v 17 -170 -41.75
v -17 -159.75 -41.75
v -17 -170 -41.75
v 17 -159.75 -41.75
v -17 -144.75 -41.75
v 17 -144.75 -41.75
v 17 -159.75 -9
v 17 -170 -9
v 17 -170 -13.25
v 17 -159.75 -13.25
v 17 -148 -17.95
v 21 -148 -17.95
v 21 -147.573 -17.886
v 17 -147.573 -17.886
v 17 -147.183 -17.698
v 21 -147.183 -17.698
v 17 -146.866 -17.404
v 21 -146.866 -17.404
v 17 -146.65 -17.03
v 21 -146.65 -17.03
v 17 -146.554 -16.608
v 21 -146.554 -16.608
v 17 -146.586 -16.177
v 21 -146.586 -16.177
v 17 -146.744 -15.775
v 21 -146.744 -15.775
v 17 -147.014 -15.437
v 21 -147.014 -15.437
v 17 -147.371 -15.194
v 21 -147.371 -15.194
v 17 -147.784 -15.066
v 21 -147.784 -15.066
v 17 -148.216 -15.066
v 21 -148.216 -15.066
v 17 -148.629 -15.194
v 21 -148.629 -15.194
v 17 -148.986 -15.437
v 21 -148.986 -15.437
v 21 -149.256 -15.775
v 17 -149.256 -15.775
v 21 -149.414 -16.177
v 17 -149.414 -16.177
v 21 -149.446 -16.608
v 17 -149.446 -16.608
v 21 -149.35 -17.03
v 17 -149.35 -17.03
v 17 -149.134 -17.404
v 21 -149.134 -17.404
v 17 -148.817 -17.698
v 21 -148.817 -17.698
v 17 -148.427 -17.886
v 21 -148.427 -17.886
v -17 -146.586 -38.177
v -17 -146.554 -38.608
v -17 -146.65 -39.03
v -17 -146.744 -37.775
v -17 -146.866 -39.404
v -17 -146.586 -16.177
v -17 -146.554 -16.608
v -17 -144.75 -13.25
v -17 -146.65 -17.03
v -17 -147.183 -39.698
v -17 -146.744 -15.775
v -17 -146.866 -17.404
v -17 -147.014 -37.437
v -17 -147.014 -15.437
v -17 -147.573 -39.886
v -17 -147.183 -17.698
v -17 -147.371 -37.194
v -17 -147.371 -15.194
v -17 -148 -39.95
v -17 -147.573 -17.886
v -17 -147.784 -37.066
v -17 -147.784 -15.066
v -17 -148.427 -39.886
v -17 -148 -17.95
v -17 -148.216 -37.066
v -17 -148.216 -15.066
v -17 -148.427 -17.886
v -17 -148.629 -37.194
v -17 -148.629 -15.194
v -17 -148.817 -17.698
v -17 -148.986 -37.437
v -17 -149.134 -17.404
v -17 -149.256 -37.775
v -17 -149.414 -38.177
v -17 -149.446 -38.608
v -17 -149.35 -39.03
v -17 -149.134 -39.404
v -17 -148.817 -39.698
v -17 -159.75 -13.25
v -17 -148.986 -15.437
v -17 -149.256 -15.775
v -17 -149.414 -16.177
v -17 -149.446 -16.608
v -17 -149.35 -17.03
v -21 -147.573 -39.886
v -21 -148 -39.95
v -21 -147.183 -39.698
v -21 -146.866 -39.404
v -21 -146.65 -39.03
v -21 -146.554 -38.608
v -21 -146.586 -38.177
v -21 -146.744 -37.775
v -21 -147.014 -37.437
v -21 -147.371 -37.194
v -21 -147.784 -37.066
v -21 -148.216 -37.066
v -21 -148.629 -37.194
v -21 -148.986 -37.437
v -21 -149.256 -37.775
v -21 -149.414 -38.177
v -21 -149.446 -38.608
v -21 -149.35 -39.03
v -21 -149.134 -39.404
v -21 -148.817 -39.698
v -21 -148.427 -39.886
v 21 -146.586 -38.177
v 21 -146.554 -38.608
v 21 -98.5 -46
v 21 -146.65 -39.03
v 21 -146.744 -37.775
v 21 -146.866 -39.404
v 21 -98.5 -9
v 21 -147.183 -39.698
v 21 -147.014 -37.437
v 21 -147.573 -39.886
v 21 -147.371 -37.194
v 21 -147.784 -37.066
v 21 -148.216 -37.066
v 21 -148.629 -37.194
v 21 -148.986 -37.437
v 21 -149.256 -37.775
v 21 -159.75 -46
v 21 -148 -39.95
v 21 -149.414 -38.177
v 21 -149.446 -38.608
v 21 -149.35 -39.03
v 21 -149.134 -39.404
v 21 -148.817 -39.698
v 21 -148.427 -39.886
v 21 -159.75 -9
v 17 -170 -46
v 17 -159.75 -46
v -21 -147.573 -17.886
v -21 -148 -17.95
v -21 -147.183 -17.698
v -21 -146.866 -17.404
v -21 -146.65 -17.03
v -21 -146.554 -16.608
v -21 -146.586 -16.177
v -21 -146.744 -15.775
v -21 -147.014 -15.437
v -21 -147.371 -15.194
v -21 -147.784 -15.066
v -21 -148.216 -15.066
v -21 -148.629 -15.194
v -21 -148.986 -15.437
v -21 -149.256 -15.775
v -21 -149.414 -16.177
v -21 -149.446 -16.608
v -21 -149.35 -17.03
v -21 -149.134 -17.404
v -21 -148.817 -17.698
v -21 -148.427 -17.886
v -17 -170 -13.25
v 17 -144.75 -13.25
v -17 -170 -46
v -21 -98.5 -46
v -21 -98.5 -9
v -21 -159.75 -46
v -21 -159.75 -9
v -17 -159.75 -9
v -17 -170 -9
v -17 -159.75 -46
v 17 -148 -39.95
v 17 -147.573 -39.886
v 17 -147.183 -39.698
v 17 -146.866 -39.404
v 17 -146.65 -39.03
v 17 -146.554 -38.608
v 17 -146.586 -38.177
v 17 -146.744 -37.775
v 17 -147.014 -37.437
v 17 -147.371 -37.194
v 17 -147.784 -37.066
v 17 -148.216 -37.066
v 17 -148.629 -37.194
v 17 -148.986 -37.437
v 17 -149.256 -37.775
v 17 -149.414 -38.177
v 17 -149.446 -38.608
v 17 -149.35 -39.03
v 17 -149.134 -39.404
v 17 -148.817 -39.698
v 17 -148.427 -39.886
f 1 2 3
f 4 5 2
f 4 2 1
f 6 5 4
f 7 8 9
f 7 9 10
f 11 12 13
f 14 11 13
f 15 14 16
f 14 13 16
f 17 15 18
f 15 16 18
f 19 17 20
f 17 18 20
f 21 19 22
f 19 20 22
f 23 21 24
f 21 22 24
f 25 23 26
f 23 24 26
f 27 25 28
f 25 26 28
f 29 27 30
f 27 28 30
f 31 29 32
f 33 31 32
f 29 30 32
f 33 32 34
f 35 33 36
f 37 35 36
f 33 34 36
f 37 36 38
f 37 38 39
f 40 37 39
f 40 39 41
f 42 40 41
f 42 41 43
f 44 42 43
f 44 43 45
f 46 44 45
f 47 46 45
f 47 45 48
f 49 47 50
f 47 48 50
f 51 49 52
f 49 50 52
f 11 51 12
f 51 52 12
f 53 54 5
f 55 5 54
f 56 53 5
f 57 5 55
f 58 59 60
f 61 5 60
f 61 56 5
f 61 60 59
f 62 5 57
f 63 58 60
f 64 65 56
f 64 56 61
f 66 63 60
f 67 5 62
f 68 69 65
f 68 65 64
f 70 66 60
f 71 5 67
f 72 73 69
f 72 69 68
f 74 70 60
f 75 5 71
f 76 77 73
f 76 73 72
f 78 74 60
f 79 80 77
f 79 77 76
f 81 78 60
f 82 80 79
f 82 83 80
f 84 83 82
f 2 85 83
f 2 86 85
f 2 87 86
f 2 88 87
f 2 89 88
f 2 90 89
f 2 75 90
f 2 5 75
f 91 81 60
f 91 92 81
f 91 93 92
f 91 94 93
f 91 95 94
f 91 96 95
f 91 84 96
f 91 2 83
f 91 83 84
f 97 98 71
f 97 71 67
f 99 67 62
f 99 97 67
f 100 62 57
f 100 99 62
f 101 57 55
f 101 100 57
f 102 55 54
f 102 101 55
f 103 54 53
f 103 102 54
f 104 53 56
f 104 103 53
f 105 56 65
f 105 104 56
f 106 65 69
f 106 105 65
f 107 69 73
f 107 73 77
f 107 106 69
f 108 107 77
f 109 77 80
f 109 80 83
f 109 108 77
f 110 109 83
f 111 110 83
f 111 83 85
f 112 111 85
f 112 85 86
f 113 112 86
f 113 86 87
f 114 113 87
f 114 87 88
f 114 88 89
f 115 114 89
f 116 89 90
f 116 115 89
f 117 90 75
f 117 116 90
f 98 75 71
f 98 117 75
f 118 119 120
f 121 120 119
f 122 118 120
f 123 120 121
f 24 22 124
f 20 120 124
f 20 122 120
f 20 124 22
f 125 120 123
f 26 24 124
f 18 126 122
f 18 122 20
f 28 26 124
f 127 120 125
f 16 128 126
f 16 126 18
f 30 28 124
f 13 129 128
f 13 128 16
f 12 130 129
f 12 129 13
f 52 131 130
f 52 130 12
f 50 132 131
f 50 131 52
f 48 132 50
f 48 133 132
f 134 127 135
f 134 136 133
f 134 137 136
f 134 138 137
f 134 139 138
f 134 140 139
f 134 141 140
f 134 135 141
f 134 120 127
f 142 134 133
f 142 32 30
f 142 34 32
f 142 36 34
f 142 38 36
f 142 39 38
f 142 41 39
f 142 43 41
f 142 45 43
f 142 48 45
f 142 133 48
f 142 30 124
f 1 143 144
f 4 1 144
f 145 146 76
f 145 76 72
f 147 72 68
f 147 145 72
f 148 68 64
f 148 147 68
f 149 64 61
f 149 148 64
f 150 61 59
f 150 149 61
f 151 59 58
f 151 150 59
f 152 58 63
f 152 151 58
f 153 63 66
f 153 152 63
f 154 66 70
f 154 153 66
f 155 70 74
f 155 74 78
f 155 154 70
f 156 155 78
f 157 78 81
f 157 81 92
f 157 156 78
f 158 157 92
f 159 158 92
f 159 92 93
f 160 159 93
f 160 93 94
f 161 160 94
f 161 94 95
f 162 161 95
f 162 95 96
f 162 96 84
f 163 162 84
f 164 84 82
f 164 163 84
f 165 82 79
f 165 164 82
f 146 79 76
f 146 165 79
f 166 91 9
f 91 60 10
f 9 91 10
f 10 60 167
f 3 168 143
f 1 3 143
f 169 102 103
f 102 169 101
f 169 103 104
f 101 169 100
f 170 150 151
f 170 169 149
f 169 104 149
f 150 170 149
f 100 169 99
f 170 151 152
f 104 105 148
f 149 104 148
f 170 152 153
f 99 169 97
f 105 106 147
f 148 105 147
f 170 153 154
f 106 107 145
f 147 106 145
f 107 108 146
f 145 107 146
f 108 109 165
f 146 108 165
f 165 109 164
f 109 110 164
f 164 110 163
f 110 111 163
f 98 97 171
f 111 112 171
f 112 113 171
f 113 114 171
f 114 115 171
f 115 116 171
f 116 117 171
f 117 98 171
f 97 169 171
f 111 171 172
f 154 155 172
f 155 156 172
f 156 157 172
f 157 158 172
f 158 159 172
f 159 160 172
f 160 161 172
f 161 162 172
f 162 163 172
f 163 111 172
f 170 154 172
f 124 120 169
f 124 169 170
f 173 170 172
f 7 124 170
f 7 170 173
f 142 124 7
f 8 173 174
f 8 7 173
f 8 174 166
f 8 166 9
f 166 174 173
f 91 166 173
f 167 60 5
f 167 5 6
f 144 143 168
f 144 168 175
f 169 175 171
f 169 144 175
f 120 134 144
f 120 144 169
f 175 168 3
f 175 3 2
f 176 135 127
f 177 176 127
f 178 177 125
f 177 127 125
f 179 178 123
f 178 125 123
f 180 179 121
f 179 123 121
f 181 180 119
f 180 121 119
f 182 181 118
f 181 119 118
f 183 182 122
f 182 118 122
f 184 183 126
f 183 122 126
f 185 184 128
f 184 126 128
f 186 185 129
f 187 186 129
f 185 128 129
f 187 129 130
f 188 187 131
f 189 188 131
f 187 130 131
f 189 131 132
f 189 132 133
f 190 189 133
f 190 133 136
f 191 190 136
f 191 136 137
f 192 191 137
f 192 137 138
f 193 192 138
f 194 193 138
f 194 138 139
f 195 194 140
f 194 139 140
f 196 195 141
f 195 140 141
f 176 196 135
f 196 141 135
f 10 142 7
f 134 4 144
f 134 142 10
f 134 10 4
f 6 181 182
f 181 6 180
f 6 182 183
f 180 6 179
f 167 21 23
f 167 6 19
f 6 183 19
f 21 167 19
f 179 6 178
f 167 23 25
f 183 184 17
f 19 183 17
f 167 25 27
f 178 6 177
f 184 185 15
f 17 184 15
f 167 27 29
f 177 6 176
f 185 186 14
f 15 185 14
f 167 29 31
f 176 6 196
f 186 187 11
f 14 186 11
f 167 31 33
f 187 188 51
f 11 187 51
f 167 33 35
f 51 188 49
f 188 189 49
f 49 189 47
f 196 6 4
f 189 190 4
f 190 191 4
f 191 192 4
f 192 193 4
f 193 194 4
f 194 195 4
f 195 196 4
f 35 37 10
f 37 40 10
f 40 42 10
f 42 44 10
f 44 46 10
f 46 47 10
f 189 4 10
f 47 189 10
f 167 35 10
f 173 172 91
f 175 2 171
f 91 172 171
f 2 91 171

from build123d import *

# Parameters (mm, degrees)
SKETCH1_W               = 50
SKETCH1_H               = 150
BOSS_EXTRUDE1_DEPTH     = 55
CUT_EXTRUDE1_DEPTH      = 168.406690428
CUT_EXTRUDE1_DEPTH_BACK = 45
SKETCH2_R               = 10.25
SKETCH7_R               = 1
SKETCH7_R_2             = 4.25
CUT_EXTRUDE3_DEPTH      = 10
SKETCH8_W               = 55
SKETCH8_H               = 55
SKETCH8_R               = 10.25
BOSS_EXTRUDE2_DEPTH     = 50
SKETCH10_W              = 8
SKETCH10_H              = 10.25
SKETCH10_W_2            = 17
SKETCH10_H_2            = 1
SKETCH10_W_3            = 34
SKETCH10_H_3            = 20
SKETCH10_H_4            = 5
CUT_EXTRUDE4_DEPTH      = 214.717102732
SKETCH11_W              = 34
SKETCH11_H              = 13.25
BOSS_EXTRUDE4_DEPTH     = 25
SKETCH13_W              = 55
SKETCH13_H              = 10
CUT_EXTRUDE5_DEPTH      = 8
SKETCH14_R              = 5.030159043
CUT_EXTRUDE6_DEPTH      = 8
SKETCH15_W              = 34
SKETCH15_H              = 0.25
BOSS_EXTRUDE5_DEPTH     = 13.25
CUT_EXTRUDE7_DEPTH      = 181.416185527
BOSS_EXTRUDE6_START     = 1.5
SKETCH19_R              = 10.25
SKETCH19_R_2            = 1
SKETCH19_R_3            = 4.25
BOSS_EXTRUDE6_DEPTH     = 1.5
CUT_EXTRUDE8_DEPTH      = 184.89467094
SKETCH21_R              = 5.030159043
SKETCH21_R_2            = 4.5
BOSS_EXTRUDE7_DEPTH     = 8
SKETCH24_W              = 4
SKETCH24_H              = 30
CUT_EXTRUDE10_DEPTH     = 181.416185527
SKETCH25_W              = 55
SKETCH25_H              = 86.25
CUT_EXTRUDE11_DEPTH     = 4
BOSS_EXTRUDE8_START     = 4
SKETCH26_R              = 1
SKETCH26_R_2            = 4.25
BOSS_EXTRUDE8_DEPTH     = 4
SKETCH27_W              = 4
SKETCH27_H              = 123.25
CUT_EXTRUDE12_DEPTH     = 181.416185527
CUT_EXTRUDE13_DEPTH     = 180.905530765
SKETCH29_W              = 42
SKETCH29_H              = 9
CUT_EXTRUDE15_DEPTH     = 174.776436838
SKETCH30_R              = 4.5
SKETCH30_R_2            = 1.45
BOSS_EXTRUDE9_DEPTH     = 4
SKETCH31_W              = 37
SKETCH31_H              = 55
CUT_EXTRUDE16_DEPTH     = 182.05247858
SKETCH32_W              = 93.338891709
SKETCH32_H              = 62.145945894
CUT_EXTRUDE17_DEPTH     = 182.05247858


with BuildPart() as part:
    # Sketch1 → Boss-Extrude1 (new body)
    with BuildSketch(Plane.XY):
        with Locations((0, -75)):
            Rectangle(SKETCH1_W, SKETCH1_H)
    extrude(amount=-BOSS_EXTRUDE1_DEPTH)

    # Sketch2 → Cut-Extrude1 (cut, two sides: drawn at the far end of the back side and taken through both)
    with BuildSketch(Plane(origin=(25, 0, 0), x_dir=(0, 0, -1), z_dir=(1, 0, 0)).offset(-CUT_EXTRUDE1_DEPTH_BACK)):
        with Locations(Location((27.5, -25, 0), (0, 0, 270))):
            Circle(SKETCH2_R)
    extrude(amount=CUT_EXTRUDE1_DEPTH + CUT_EXTRUDE1_DEPTH_BACK, mode=Mode.SUBTRACT)

    # Sketch7 → Cut-Extrude3 (cut)
    with BuildSketch(Plane(origin=(-20, 0, 0), x_dir=(0, 0, -1), z_dir=(1, 0, 0))):
        with Locations(Location((27.5, -17, 0), (0, 0, 90))):
            Circle(SKETCH7_R)
        with Locations(Location((35.5, -25, 0), (0, 0, 90))):
            Circle(SKETCH7_R)
        with Locations(Location((27.5, -33, 0), (0, 0, 90))):
            Circle(SKETCH7_R)
        with Locations(Location((19.5, -25, 0), (0, 0, 90))):
            Circle(SKETCH7_R)
        with Locations(Location((27.5, -25, 0), (0, 0, 90))):
            Circle(SKETCH7_R_2)
    extrude(amount=-CUT_EXTRUDE3_DEPTH, mode=Mode.SUBTRACT)

    # Sketch8 → Boss-Extrude2 (add)
    with BuildSketch(Plane(origin=(25, 0, 0), x_dir=(0, 0, -1), z_dir=(1, 0, 0))):
        with Locations((27.5, -177.5)):
            Rectangle(SKETCH8_W, SKETCH8_H)
        with Locations(Location((27.5, -180, 0), (0, 0, 90))):
            Circle(SKETCH8_R, mode=Mode.SUBTRACT)
    extrude(amount=-BOSS_EXTRUDE2_DEPTH)

    # Sketch10 → Cut-Extrude4 (cut, through all)
    with BuildSketch(Plane.XY):
        Polygon((-17, -205), (17, -205), (17, -191.25), (0, -191.25), (-17, -191.25), align=None)
        Polygon((-25, -205), (-17, -205), (-17, -191.25), (-17, -190.25), (-25, -190.25), align=None)
        Polygon((17, -191.25), (17, -205), (25, -205), (25, -190.25), (17, -190.25), align=None)
        with Locations((-21, -185.125)):
            Rectangle(SKETCH10_W, SKETCH10_H)
        with Locations((-21, -174.875)):
            Rectangle(SKETCH10_W, SKETCH10_H)
        with Locations((21, -174.875)):
            Rectangle(SKETCH10_W, SKETCH10_H)
        with Locations((21, -185.125)):
            Rectangle(SKETCH10_W, SKETCH10_H)
        with Locations((-8.5, -185.125)):
            Rectangle(SKETCH10_W_2, SKETCH10_H)
        with Locations((8.5, -185.125)):
            Rectangle(SKETCH10_W_2, SKETCH10_H)
        Polygon((0, -180), (17, -180), (17, -169.75), (-17, -169.75), (-17, -180), align=None)
        with Locations((-8.5, -190.75)):
            Rectangle(SKETCH10_W_2, SKETCH10_H_2)
        with Locations((8.5, -190.75)):
            Rectangle(SKETCH10_W_2, SKETCH10_H_2)
        with Locations((0, -154.75)):
            Rectangle(SKETCH10_W_3, SKETCH10_H_3)
        with Locations((0, -167.25)):
            Rectangle(SKETCH10_W_3, SKETCH10_H_4)
    extrude(amount=-CUT_EXTRUDE4_DEPTH, mode=Mode.SUBTRACT)

    # Sketch11 → Boss-Extrude4 (add)
    with BuildSketch(Plane.XZ.offset(144.75)):
        with Locations((0, -6.625)):
            Rectangle(SKETCH11_W, SKETCH11_H)
        with Locations((0, -48.375)):
            Rectangle(SKETCH11_W, SKETCH11_H)
    extrude(amount=BOSS_EXTRUDE4_DEPTH)

    # Sketch13 → Cut-Extrude5 (cut)
    with BuildSketch(Plane(origin=(25, 0, 0), x_dir=(0, 0, -1), z_dir=(1, 0, 0))):
        with Locations((27.5, -164.75)):
            Rectangle(SKETCH13_W, SKETCH13_H)
    cut_extrude5 = extrude(amount=-CUT_EXTRUDE5_DEPTH, mode=Mode.SUBTRACT)

    # Mirror2: Cut-Extrude5 across plane
    add(cut_extrude5.mirror(Plane(origin=(0, 0, 0), x_dir=(0, 0, 1), z_dir=(1, 0, 0))), mode=Mode.SUBTRACT)

    # Sketch14 → Cut-Extrude6 (cut)
    with BuildSketch(Plane(origin=(25, 0, 0), x_dir=(0, 0, -1), z_dir=(1, 0, 0))):
        with Locations(Location((16.5, -148, 0), (0, 0, 90))):
            Circle(SKETCH14_R)
        with Locations(Location((38.5, -148, 0), (0, 0, 90))):
            Circle(SKETCH14_R)
    cut_extrude6 = extrude(amount=-CUT_EXTRUDE6_DEPTH, mode=Mode.SUBTRACT)

    # Mirror3: Cut-Extrude6 across plane
    add(cut_extrude6.mirror(Plane(origin=(0, 0, 0), x_dir=(0, 0, 1), z_dir=(1, 0, 0))), mode=Mode.SUBTRACT)

    # Sketch15 → Boss-Extrude5 (add)
    with BuildSketch(Plane.XY):
        with Locations((0, -169.875)):
            Rectangle(SKETCH15_W, SKETCH15_H)
    boss_extrude5 = extrude(amount=-BOSS_EXTRUDE5_DEPTH)

    # Mirror4: Boss-Extrude5 across plane
    add(boss_extrude5.mirror(Plane.XY.offset(-27.5)))

    # Sketch16 → Cut-Extrude7 (cut, through all)
    with BuildSketch(Plane.XY):
        Polygon((-18.5, 0), (-18.5, -14.75), (-18.5, -35.25), (-18.5, -43.5), (25, -43.5), (25, 0), align=None)
    extrude(amount=-CUT_EXTRUDE7_DEPTH, mode=Mode.SUBTRACT)

    # Sketch19 → Boss-Extrude6 (add)
    with BuildSketch(Plane(origin=(-20, 0, 0), x_dir=(0, 0, -1), z_dir=(1, 0, 0)).offset(BOSS_EXTRUDE6_START)):
        with Locations((27.5, -25)):
            Circle(SKETCH19_R)
        with Locations(Location((27.5, -17, 0), (0, 0, 90))):
            Circle(SKETCH19_R_2, mode=Mode.SUBTRACT)
        with Locations(Location((27.5, -33, 0), (0, 0, 90))):
            Circle(SKETCH19_R_2, mode=Mode.SUBTRACT)
        with Locations(Location((19.5, -25, 0), (0, 0, 90))):
            Circle(SKETCH19_R_2, mode=Mode.SUBTRACT)
        with Locations(Location((35.5, -25, 0), (0, 0, 90))):
            Circle(SKETCH19_R_2, mode=Mode.SUBTRACT)
        with Locations(Location((27.5, -25, 0), (0, 0, 90))):
            Circle(SKETCH19_R_3, mode=Mode.SUBTRACT)
    extrude(amount=-BOSS_EXTRUDE6_DEPTH)

    # Sketch20 → Cut-Extrude8 (cut, through all)
    with BuildSketch(Plane(origin=(-18.5, 0, 0), x_dir=(0, 0, -1), z_dir=(1, 0, 0))):
        with BuildLine():
            Line((0, 0), (0, -43.5))
            Line((0, -43.5), (9, -43.5))
            Line((9, -43.5), (9, -25))
            ThreePointArc((9, -25), (27.5, -6.5), (46, -25))
            Line((46, -25), (46, -43.5))
            Line((46, -43.5), (55, -43.5))
            Line((55, -43.5), (55, 0))
            Line((55, 0), (0, 0))
        make_face()
    extrude(amount=-CUT_EXTRUDE8_DEPTH, mode=Mode.SUBTRACT)

    # Sketch21 → Boss-Extrude7 (add)
    # profile 1 of 2: a face of its own
    with BuildSketch(Plane(origin=(25, 0, 0), x_dir=(0, 0, -1), z_dir=(1, 0, 0))):
        with Locations(Location((16.5, -148, 0), (0, 0, 229.751587581))):
            Circle(SKETCH21_R)
        with Locations(Location((16.5, -148, 0), (0, 0, 90))):
            Circle(SKETCH21_R_2, mode=Mode.SUBTRACT)
    # profile 2 of 2: a face of its own
    with BuildSketch(Plane(origin=(25, 0, 0), x_dir=(0, 0, -1), z_dir=(1, 0, 0))):
        with Locations(Location((38.5, -148, 0), (0, 0, 310.248412419))):
            Circle(SKETCH21_R)
        with Locations(Location((38.5, -148, 0), (0, 0, 90))):
            Circle(SKETCH21_R_2, mode=Mode.SUBTRACT)
    boss_extrude7 = extrude(amount=-BOSS_EXTRUDE7_DEPTH)

    # Mirror5: Boss-Extrude7 across plane
    add(boss_extrude7.mirror(Plane(origin=(0, 0, 0), x_dir=(0, 0, 1), z_dir=(1, 0, 0))))

    # Sketch24 → Cut-Extrude10 (cut, through all)
    with BuildSketch(Plane.XY):
        with Locations((-23, -144.75)):
            Rectangle(SKETCH24_W, SKETCH24_H)
        with Locations((23, -144.75)):
            Rectangle(SKETCH24_W, SKETCH24_H)
    extrude(amount=-CUT_EXTRUDE10_DEPTH, mode=Mode.SUBTRACT)

    # Sketch25 → Cut-Extrude11 (cut)
    with BuildSketch(Plane(origin=(25, 0, 0), x_dir=(0, 0, -1), z_dir=(1, 0, 0))):
        with Locations((27.5, -86.625)):
            Rectangle(SKETCH25_W, SKETCH25_H)
    extrude(amount=-CUT_EXTRUDE11_DEPTH, mode=Mode.SUBTRACT)

    # Sketch26 → Boss-Extrude8 (add)
    with BuildSketch(Plane(origin=(-18.5, 0, 0), x_dir=(0, 0, -1), z_dir=(1, 0, 0)).offset(BOSS_EXTRUDE8_START)):
        with BuildLine():
            Line((46, -43.5), (46, -25))
            ThreePointArc((46, -25), (27.5, -6.5), (9, -25))
            Line((9, -25), (9, -43.5))
            Line((9, -43.5), (46, -43.5))
        make_face()
        with Locations(Location((35.5, -25, 0), (0, 0, 90))):
            Circle(SKETCH26_R, mode=Mode.SUBTRACT)
        with Locations(Location((27.5, -25, 0), (0, 0, 90))):
            Circle(SKETCH26_R_2, mode=Mode.SUBTRACT)
        with Locations(Location((19.5, -25, 0), (0, 0, 90))):
            Circle(SKETCH26_R, mode=Mode.SUBTRACT)
        with Locations(Location((27.5, -33, 0), (0, 0, 90))):
            Circle(SKETCH26_R, mode=Mode.SUBTRACT)
        with Locations(Location((27.5, -17, 0), (0, 0, 90))):
            Circle(SKETCH26_R, mode=Mode.SUBTRACT)
    extrude(amount=-BOSS_EXTRUDE8_DEPTH)

    # Sketch27 → Cut-Extrude12 (cut, through all)
    with BuildSketch(Plane.XY):
        with Locations((-23, -68.125)):
            Rectangle(SKETCH27_W, SKETCH27_H)
    extrude(amount=-CUT_EXTRUDE12_DEPTH, mode=Mode.SUBTRACT)

    # Sketch28 → Cut-Extrude13 (cut, through all)
    with BuildSketch(Plane.XY):
        with BuildLine():
            Line((21, -43.5), (-14.5, -43.5))
            ThreePointArc((-14.5, -43.5), (10.602290732, -53.897709268), (21, -79))
            Line((21, -79), (21, -43.5))
        make_face()
    extrude(amount=-CUT_EXTRUDE13_DEPTH, mode=Mode.SUBTRACT)

    # Sketch29 → Cut-Extrude15 (cut, through all)
    with BuildSketch(Plane.XZ.offset(170)):
        with Locations((0, -50.5)):
            Rectangle(SKETCH29_W, SKETCH29_H)
        with Locations((0, -4.5)):
            Rectangle(SKETCH29_W, SKETCH29_H)
    extrude(amount=-CUT_EXTRUDE15_DEPTH, mode=Mode.SUBTRACT)

    # Sketch30 → Boss-Extrude9 (add)
    # profile 1 of 2: a face of its own
    with BuildSketch(Plane(origin=(21, 0, 0), x_dir=(0, 0, -1), z_dir=(1, 0, 0))):
        with Locations(Location((16.5, -148, 0), (0, 0, 223.761742693))):
            Circle(SKETCH30_R)
        with Locations((16.5, -148)):
            Circle(SKETCH30_R_2, mode=Mode.SUBTRACT)
    # profile 2 of 2: a face of its own
    with BuildSketch(Plane(origin=(21, 0, 0), x_dir=(0, 0, -1), z_dir=(1, 0, 0))):
        with Locations(Location((38.5, -148, 0), (0, 0, 316.238257307))):
            Circle(SKETCH30_R)
        with Locations((38.5, -148)):
            Circle(SKETCH30_R_2, mode=Mode.SUBTRACT)
    boss_extrude9 = extrude(amount=-BOSS_EXTRUDE9_DEPTH)

    # Mirror6: Boss-Extrude9 across plane
    add(boss_extrude9.mirror(Plane(origin=(0, 0, 0), x_dir=(0, 0, 1), z_dir=(1, 0, 0))))

    # Sketch31 → Cut-Extrude16 (cut, through all)
    with BuildSketch(Plane.ZY.offset(21)):
        with Locations((-27.5, -71)):
            Rectangle(SKETCH31_W, SKETCH31_H)
    extrude(amount=-CUT_EXTRUDE16_DEPTH, mode=Mode.SUBTRACT)


with BuildPart() as cut_extrude16_piece_1:
    # of the separate pieces the step leaves, piece 1, a body of its own (cut_extrude16_pieces)
    add(part.part.solids().sort_by_distance((17, -170, -13.25))[0])


with BuildPart() as cut_extrude16_piece_2:
    # of the separate pieces the step leaves, piece 2, a body of its own (cut_extrude16_pieces)
    add(part.part.solids().sort_by_distance((-21, -43.5, -9))[0])

    # Sketch32 → Cut-Extrude17 (cut, through all)
    with BuildSketch(Plane.ZY.offset(21)):
        with Locations((-22.821058128, -34.382182034)):
            Rectangle(SKETCH32_W, SKETCH32_H)
    extrude(amount=-CUT_EXTRUDE17_DEPTH, mode=Mode.SUBTRACT)


solid = cut_extrude16_piece_1.part
